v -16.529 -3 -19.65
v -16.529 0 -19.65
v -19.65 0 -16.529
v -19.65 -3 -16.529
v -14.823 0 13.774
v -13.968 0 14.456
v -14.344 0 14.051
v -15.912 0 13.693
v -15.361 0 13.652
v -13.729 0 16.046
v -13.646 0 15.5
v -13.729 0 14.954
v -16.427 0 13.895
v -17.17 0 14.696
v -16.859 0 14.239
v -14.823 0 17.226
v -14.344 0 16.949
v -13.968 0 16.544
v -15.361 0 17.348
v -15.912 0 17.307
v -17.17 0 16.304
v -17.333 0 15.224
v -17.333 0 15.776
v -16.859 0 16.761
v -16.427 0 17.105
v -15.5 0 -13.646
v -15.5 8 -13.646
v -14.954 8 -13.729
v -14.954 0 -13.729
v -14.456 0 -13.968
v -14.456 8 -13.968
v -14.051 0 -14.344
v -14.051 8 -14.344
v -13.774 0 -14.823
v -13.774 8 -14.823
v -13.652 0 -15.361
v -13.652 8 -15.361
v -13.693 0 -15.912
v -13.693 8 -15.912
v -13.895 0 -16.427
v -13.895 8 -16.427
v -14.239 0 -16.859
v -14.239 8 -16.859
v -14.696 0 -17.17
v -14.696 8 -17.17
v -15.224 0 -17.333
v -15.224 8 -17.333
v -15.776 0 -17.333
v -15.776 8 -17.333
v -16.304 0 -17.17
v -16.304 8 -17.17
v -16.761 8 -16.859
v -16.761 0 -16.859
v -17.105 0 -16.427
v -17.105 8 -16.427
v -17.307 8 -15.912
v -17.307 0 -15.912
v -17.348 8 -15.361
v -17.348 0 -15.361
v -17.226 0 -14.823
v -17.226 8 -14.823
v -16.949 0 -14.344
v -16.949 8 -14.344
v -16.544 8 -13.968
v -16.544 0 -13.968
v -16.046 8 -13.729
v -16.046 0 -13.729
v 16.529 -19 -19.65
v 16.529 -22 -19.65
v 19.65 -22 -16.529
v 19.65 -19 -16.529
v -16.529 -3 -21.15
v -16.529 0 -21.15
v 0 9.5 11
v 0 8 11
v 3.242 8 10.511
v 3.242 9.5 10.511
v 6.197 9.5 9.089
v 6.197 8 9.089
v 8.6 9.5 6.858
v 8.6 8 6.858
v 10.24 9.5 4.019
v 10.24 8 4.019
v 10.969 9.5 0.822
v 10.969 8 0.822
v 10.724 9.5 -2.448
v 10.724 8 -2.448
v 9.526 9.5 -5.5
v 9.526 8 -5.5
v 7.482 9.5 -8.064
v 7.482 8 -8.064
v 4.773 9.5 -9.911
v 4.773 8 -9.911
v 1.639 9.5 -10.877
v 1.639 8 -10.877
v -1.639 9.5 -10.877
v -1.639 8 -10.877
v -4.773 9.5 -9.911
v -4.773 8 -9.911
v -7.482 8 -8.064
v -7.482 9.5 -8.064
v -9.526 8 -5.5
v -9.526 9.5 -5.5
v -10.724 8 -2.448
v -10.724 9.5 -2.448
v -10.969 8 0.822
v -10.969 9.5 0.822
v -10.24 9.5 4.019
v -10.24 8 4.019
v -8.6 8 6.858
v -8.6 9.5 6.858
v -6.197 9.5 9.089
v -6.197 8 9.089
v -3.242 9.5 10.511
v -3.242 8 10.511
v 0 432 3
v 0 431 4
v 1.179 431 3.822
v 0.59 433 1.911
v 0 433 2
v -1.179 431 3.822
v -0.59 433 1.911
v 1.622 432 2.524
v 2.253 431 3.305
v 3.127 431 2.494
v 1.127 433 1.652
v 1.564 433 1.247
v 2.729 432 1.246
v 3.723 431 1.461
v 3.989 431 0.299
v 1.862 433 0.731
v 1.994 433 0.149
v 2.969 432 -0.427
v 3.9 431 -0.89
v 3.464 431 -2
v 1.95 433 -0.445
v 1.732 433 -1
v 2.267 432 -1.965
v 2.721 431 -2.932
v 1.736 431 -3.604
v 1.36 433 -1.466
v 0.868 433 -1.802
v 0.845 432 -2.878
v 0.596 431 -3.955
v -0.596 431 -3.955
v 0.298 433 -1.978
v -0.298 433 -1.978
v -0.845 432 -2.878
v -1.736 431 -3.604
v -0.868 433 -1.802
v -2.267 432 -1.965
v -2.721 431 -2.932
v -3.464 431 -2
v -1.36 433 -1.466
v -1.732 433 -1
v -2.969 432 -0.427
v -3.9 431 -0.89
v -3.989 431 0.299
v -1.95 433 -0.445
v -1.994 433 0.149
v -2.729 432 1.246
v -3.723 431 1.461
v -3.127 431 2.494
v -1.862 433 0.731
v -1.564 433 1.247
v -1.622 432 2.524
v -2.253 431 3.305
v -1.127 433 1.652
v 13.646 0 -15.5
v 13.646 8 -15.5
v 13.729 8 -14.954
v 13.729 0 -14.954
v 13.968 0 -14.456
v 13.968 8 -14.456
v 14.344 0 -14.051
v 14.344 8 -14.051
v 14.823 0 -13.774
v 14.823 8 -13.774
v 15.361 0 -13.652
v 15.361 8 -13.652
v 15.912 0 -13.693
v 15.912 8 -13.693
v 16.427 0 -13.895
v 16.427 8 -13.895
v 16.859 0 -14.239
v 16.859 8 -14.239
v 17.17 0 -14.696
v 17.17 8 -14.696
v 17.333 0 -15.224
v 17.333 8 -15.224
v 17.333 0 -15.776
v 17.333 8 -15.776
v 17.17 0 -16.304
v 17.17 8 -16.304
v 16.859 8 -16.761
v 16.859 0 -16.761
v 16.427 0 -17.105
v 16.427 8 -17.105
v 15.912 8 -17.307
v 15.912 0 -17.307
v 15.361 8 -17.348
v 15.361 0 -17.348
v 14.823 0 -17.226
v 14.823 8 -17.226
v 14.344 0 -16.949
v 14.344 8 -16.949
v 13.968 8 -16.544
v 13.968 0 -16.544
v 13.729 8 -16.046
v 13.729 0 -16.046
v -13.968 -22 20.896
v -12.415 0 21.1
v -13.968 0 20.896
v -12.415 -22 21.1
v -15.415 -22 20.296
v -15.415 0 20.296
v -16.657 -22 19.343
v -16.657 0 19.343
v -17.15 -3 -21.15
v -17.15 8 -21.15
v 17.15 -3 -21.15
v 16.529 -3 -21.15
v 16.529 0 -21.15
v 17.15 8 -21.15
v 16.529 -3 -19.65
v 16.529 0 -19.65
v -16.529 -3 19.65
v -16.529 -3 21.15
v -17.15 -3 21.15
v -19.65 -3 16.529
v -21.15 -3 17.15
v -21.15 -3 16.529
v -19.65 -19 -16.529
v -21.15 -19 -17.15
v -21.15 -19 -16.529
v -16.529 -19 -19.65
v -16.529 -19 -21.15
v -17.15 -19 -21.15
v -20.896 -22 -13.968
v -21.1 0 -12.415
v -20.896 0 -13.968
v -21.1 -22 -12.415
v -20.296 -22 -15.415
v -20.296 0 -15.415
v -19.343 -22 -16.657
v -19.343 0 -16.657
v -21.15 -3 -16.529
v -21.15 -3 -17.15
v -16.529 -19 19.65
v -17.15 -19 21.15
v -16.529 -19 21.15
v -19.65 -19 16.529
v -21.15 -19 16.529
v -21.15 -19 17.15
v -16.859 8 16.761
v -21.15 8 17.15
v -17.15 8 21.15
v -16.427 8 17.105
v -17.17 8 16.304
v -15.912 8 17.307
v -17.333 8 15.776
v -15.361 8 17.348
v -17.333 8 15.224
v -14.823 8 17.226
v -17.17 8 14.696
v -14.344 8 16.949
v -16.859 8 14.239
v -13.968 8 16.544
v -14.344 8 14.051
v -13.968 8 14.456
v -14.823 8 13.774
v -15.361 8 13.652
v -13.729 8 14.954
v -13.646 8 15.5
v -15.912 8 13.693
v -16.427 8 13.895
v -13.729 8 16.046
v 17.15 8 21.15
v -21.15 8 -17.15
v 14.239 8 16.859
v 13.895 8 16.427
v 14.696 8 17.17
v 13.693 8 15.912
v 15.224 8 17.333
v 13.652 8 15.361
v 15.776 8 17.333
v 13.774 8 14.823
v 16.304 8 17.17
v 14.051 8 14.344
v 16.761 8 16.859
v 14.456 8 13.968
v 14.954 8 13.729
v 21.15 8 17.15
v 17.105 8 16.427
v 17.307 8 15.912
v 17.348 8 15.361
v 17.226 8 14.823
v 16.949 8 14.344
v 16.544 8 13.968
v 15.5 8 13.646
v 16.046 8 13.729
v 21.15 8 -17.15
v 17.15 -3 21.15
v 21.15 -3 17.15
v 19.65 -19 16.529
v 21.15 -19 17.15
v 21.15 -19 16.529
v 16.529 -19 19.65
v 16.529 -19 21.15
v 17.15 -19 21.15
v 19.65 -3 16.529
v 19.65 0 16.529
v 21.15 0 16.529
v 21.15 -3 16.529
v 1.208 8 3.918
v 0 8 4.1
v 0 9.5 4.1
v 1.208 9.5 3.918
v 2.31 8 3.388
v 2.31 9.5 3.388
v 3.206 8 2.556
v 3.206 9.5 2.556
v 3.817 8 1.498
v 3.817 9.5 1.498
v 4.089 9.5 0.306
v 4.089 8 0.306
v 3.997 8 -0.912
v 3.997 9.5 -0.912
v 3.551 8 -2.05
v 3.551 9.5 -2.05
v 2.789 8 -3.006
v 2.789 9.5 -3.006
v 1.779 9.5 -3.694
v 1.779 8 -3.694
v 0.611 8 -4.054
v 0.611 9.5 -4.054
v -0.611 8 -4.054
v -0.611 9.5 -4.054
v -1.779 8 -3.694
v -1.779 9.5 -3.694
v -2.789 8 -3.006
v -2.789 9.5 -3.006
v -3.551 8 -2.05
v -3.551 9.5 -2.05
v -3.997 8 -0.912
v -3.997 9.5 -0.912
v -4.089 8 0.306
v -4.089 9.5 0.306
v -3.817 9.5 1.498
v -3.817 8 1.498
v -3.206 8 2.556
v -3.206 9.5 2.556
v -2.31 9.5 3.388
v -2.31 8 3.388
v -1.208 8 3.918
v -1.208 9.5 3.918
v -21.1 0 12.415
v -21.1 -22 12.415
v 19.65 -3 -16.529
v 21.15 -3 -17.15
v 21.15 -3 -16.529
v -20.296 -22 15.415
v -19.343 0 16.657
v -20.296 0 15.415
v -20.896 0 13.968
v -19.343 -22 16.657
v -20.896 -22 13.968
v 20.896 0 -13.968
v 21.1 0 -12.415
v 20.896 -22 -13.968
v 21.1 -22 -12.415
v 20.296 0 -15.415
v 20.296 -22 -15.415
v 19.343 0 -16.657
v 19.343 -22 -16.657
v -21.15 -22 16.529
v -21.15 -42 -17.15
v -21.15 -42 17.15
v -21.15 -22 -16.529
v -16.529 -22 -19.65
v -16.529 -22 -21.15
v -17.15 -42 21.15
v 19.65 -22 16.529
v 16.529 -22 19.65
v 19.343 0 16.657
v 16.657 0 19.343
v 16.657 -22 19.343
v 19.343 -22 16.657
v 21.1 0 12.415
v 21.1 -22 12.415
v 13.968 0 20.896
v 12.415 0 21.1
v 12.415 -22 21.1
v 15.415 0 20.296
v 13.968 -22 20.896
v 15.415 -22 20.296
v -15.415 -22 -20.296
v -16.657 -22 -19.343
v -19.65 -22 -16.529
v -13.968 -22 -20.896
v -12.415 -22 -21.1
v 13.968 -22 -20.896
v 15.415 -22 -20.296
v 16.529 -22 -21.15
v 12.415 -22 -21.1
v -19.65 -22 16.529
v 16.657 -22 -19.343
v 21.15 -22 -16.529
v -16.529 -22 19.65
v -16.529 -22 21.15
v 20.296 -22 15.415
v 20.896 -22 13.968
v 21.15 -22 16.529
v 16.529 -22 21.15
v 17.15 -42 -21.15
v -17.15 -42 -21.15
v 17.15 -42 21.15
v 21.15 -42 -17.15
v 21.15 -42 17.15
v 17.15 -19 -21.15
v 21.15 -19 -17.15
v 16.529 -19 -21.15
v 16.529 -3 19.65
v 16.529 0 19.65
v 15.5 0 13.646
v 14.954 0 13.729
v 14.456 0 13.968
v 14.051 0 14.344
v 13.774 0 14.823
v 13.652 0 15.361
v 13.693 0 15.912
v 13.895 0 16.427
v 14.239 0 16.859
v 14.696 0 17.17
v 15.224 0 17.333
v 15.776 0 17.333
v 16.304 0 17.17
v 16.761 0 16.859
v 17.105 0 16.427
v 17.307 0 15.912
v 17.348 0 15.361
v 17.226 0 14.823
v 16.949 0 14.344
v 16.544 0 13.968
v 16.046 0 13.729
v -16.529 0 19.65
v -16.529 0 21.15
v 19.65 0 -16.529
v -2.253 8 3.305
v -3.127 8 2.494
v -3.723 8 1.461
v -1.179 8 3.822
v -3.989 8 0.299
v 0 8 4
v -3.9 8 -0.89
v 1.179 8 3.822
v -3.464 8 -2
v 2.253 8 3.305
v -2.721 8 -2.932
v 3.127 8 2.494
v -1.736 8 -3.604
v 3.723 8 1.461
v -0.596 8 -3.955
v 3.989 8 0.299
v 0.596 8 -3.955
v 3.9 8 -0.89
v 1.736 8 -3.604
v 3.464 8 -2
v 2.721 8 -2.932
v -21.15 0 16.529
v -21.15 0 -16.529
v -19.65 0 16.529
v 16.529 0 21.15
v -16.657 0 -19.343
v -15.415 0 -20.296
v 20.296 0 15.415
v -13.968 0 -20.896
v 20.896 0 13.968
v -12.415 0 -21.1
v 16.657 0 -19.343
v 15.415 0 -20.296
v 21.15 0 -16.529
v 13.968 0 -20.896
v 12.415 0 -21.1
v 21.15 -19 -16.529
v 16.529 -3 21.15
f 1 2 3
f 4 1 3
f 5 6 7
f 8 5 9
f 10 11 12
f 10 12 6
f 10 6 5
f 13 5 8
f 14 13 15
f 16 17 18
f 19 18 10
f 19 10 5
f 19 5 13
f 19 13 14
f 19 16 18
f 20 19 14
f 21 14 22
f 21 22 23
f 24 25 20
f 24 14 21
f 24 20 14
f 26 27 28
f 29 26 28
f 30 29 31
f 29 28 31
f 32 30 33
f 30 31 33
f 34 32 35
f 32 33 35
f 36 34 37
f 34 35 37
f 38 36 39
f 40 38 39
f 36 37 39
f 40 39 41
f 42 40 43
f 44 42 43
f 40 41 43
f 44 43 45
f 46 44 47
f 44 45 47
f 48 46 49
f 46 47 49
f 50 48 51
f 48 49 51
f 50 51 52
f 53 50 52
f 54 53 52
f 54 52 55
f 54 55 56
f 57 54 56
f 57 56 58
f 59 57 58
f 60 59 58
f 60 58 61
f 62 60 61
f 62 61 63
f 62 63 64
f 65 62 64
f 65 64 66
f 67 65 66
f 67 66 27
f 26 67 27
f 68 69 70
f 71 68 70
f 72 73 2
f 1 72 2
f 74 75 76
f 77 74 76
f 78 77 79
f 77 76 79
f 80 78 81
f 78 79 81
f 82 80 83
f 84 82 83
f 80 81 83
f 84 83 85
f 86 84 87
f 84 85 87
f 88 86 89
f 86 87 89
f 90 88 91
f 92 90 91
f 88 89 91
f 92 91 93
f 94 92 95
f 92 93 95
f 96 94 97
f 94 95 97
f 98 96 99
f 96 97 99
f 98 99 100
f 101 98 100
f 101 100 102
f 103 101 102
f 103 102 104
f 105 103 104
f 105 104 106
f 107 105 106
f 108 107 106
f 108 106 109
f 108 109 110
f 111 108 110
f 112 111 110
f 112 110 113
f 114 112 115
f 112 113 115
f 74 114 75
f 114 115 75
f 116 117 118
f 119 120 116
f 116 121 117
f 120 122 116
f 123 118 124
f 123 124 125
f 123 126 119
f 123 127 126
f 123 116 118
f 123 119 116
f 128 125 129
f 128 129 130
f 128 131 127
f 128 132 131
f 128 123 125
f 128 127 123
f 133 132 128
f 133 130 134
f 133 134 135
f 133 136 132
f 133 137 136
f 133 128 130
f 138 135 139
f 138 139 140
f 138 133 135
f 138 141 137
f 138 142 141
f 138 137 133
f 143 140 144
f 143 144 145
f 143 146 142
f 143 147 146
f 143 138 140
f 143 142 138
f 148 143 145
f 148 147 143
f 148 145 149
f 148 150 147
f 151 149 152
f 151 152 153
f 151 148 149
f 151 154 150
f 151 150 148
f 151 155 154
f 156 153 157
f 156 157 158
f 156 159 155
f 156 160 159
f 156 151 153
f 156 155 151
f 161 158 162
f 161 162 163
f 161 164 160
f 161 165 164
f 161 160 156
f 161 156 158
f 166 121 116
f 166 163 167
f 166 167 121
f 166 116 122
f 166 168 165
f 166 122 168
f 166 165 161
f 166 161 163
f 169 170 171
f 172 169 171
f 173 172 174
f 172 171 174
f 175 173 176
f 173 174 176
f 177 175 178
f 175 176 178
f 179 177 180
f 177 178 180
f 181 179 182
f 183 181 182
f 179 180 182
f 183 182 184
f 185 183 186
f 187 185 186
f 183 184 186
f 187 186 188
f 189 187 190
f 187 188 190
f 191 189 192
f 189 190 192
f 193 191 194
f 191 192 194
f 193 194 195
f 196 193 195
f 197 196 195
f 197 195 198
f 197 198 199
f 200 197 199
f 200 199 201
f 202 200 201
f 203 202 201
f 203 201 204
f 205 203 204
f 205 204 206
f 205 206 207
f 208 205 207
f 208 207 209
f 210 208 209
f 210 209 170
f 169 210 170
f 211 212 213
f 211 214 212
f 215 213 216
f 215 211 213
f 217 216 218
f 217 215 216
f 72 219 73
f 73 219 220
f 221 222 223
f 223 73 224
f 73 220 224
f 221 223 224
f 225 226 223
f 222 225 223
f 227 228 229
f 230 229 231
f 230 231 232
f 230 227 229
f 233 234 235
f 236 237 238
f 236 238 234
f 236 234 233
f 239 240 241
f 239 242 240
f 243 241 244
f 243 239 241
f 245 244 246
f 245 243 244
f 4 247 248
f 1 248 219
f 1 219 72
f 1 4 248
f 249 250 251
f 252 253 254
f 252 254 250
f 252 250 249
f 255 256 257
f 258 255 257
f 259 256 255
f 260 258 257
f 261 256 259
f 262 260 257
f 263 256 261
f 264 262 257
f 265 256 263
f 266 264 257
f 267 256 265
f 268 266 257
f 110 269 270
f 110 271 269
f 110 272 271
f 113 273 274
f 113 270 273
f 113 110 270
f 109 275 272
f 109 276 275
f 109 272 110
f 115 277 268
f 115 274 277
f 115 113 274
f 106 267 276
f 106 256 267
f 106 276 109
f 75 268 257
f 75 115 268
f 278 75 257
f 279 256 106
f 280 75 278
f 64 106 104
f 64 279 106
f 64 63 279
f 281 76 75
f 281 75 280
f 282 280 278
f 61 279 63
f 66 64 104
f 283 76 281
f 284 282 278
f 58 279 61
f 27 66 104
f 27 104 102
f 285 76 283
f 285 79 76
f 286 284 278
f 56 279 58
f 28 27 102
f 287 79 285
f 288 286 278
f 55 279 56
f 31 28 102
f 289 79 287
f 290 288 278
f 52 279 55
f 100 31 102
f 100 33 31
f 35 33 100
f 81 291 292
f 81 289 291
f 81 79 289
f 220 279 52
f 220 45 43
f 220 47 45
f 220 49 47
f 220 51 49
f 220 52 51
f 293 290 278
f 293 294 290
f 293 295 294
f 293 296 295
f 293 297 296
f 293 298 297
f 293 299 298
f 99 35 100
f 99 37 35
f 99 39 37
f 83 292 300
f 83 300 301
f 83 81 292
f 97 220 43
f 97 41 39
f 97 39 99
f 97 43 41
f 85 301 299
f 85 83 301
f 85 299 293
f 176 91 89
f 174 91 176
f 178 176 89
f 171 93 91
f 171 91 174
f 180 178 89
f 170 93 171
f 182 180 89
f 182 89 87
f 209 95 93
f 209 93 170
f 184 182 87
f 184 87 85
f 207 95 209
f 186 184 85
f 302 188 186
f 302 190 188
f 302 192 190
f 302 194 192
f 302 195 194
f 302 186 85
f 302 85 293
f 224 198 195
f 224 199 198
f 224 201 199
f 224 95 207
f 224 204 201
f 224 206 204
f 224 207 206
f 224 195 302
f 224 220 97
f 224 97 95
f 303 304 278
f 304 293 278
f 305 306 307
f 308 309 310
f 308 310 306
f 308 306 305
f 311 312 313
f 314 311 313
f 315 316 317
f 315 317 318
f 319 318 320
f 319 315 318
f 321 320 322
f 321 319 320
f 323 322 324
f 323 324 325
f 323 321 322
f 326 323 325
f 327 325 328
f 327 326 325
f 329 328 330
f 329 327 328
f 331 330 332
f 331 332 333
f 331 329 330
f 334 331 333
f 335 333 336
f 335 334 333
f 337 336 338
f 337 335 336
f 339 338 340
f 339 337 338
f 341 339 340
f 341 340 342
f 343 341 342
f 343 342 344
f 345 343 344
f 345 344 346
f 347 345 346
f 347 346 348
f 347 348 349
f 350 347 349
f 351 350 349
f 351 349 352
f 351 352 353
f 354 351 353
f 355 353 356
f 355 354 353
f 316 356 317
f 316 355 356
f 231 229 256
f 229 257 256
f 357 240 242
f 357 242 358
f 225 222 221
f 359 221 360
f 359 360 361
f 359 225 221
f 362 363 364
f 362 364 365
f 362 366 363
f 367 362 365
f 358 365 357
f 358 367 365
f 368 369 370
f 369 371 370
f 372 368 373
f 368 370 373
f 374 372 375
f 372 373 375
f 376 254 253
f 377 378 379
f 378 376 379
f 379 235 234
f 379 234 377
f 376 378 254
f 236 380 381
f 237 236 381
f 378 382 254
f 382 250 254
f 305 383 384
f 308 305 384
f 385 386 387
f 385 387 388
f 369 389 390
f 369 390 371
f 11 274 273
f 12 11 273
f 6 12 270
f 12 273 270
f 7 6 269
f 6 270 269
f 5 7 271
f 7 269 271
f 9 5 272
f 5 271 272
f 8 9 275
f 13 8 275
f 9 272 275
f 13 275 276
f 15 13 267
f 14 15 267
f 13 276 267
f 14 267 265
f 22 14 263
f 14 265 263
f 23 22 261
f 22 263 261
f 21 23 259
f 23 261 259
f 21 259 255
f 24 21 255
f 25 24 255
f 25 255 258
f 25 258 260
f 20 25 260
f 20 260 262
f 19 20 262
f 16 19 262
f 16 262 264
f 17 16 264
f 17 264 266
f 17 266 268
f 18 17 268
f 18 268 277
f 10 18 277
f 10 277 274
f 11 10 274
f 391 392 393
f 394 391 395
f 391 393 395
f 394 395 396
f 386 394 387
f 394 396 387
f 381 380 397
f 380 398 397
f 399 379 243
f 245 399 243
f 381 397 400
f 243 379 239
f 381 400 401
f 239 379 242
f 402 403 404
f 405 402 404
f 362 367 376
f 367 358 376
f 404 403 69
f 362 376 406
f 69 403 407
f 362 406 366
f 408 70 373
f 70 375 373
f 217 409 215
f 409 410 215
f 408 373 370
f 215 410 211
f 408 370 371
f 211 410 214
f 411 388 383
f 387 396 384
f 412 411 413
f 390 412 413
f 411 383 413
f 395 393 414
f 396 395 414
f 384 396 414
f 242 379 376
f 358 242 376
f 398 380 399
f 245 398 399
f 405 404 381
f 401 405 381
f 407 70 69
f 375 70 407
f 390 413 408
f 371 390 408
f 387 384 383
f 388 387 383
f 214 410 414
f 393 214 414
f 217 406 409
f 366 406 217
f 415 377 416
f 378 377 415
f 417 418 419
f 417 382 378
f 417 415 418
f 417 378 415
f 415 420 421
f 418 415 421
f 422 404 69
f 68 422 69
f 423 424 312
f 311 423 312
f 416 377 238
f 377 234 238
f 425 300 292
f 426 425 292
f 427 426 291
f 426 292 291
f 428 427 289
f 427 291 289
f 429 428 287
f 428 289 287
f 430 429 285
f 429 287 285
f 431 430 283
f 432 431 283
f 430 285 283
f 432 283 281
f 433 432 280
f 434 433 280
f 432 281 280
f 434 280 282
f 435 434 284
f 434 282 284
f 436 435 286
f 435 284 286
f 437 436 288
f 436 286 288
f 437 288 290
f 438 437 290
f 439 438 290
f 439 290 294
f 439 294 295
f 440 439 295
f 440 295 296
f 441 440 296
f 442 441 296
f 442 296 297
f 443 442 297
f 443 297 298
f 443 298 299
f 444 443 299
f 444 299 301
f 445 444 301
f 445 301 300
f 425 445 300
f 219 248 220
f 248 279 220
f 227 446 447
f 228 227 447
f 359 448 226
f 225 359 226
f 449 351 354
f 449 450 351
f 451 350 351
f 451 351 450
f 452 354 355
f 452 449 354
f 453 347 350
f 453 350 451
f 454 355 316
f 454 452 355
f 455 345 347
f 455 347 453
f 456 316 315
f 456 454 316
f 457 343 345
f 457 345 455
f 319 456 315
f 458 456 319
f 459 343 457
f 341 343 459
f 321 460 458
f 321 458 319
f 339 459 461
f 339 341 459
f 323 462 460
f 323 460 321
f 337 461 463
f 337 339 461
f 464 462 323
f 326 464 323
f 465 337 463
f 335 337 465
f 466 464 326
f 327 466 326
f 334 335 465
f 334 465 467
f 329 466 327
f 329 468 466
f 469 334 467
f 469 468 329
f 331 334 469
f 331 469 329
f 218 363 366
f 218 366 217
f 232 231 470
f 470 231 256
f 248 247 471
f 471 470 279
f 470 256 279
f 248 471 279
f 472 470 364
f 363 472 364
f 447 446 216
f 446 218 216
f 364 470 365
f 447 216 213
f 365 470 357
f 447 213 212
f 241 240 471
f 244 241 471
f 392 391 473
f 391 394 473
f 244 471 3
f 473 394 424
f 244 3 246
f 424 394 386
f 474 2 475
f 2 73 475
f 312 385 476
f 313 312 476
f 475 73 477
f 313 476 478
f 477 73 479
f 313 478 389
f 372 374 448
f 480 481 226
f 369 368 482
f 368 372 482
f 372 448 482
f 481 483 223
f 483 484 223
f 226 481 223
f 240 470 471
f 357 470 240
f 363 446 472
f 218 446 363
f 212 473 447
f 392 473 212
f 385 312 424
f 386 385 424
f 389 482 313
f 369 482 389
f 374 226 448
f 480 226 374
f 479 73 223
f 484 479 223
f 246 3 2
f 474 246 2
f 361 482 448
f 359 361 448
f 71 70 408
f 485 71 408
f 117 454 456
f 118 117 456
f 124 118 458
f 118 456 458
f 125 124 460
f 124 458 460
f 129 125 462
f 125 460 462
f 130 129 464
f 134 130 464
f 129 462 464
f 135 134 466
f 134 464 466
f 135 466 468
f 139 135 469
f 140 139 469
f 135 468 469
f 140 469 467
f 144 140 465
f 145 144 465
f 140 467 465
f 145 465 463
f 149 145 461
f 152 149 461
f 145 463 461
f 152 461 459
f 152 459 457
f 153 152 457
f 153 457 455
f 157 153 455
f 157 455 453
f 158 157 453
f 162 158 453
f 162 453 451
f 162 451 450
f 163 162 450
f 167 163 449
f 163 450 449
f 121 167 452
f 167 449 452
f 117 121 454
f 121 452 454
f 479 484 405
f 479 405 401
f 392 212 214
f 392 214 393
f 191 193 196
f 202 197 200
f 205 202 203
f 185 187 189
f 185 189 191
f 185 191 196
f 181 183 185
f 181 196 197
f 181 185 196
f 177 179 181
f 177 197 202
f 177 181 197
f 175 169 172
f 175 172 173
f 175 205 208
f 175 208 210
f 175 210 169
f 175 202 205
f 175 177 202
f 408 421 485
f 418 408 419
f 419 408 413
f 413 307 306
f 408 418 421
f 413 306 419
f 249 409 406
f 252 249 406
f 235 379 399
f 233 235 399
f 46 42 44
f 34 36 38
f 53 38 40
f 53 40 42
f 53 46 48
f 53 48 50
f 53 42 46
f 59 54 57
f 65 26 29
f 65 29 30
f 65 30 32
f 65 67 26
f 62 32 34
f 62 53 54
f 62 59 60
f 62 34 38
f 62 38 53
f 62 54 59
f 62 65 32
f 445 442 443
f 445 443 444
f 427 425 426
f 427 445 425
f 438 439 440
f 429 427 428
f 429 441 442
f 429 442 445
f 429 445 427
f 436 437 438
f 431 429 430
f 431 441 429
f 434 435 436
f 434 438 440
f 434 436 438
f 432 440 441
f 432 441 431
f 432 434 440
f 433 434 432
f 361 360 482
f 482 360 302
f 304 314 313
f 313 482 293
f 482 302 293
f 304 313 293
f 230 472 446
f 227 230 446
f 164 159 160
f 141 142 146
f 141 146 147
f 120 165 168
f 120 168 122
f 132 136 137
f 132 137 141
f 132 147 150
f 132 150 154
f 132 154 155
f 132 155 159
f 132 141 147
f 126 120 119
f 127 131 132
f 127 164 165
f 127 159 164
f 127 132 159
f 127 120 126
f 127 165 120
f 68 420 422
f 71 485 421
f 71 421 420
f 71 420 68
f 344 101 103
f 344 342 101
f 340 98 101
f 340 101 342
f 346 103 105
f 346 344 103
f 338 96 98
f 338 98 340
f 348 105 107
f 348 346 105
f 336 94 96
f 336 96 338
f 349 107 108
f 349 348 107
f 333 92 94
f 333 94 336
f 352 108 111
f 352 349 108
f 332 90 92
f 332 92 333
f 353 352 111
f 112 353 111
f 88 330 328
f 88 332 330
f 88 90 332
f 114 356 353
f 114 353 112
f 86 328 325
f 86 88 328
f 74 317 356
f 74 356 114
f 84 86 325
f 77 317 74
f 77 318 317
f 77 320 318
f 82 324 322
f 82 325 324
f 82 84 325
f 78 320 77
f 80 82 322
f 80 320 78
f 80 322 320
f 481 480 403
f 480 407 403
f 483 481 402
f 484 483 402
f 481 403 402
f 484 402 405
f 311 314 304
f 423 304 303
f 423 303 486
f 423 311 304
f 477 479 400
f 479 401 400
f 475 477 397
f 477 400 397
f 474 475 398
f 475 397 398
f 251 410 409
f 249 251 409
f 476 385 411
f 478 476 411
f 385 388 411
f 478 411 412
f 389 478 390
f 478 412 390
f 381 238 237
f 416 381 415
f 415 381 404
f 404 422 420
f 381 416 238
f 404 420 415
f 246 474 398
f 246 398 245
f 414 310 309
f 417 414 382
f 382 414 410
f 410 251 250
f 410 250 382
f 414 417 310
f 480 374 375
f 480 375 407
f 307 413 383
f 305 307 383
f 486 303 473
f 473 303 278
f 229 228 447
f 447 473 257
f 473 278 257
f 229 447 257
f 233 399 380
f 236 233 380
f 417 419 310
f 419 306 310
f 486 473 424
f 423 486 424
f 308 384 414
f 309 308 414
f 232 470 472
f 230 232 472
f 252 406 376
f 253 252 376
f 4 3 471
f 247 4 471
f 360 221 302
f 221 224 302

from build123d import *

# Parameters (mm, degrees)
ESBO_O1_W              = 42.3
ESBO_O1_H              = 42.3
UPPERBODY_DEPTH        = 8
CHANFRO1_SIZE          = 4
ESBO_O2_R              = 11
ESBO_O2_R_2            = 4.1
LITTLETOPCIRCLE_DEPTH  = 1.5
ESBO_O3_R              = 1.853680608
MOUNTINGHOLES_DEPTH    = 25
PADR_OCIRCULAR1_COUNT  = 4
LITTLEMETALTABS_DEPTH  = 3
PADR_OCIRCULAR2_COUNT  = 4
MIDDLEBODY_DEPTH       = 22
FILETE1_R              = 6
ESBO_O9_W              = 42.3
ESBO_O9_H              = 42.3
BOTTOMBODY_DEPTH       = 8
CHANFRO5_SIZE          = 4
LITTLEMETALTABS2_DEPTH = 3
PADR_OCIRCULAR3_COUNT  = 4
ESBO_O4_R              = 4
LEADSCREW_DEPTH        = 425
CHANFRO2_SIZE          = 2
EXTRUDE_1_DEPTH        = 12


with BuildPart() as part:
    # Esboço1 → UpperBody (new body)
    with BuildSketch(Plane(origin=(0, 0, 0), x_dir=(1, 0, 0), z_dir=(0, 1, 0))):
        Rectangle(ESBO_O1_W, ESBO_O1_H)
    extrude(amount=UPPERBODY_DEPTH)

    # Chanfro1
    chanfro1_edges = [part.edges().sort_by_distance(p)[0] for p in [
        (-21.15, 4, 21.15),
        (21.15, 4, -21.15),
        (-21.15, 4, -21.15),
        (21.15, 4, 21.15),
    ]]
    chamfer(chanfro1_edges, length=CHANFRO1_SIZE)

    # Esboço2 → LittleTopCircle (add)
    with BuildSketch(Plane(origin=(0, 8, 0), x_dir=(1, 0, 0), z_dir=(0, 1, 0))):
        Circle(ESBO_O2_R)
        Circle(ESBO_O2_R_2, mode=Mode.SUBTRACT)
    extrude(amount=LITTLETOPCIRCLE_DEPTH)

    # Esboço3 → MountingHoles (cut)
    with BuildSketch(Plane(origin=(0, 8, 0), x_dir=(1, 0, 0), z_dir=(0, 1, 0))):
        with Locations((-15.5, 15.5)):
            Circle(ESBO_O3_R)
    mountingholes = extrude(amount=-MOUNTINGHOLES_DEPTH, mode=Mode.SUBTRACT)

    # PadrãoCircular1: MountingHoles ×4 about axis
    padr_ocircular1_axis = Axis((0, 8, 0), (0, 1, 0))
    for i in range(1, PADR_OCIRCULAR1_COUNT):
        add(mountingholes.rotate(padr_ocircular1_axis, i * 360 / PADR_OCIRCULAR1_COUNT), mode=Mode.SUBTRACT)

    # Esboço7 → LittleMetalTabs (add)
    with BuildSketch(Plane.XZ):
        Polygon((-19.65, -16.528679656), (-21.15, -16.528679656), (-21.15, -17.15), (-17.15, -21.15), (-16.528679656, -21.15), (-16.528679656, -19.65), align=None)
    littlemetaltabs = extrude(amount=LITTLEMETALTABS_DEPTH)

    # PadrãoCircular2: LittleMetalTabs ×4 about axis
    padr_ocircular2_axis = Axis((0, 9.5, 0), (0, 1, 0))
    for i in range(1, PADR_OCIRCULAR2_COUNT):
        add(littlemetaltabs.rotate(padr_ocircular2_axis, i * 360 / PADR_OCIRCULAR2_COUNT))

    # Esboço8 → MiddleBody (add)
    with BuildSketch(Plane.XZ):
        Polygon((-14.9, 21.1), (14.9, 21.1), (21.1, 14.9), (21.1, -14.9), (14.9, -21.1), (-14.9, -21.1), (-21.1, -14.9), (-21.1, 14.9), align=None)
    extrude(amount=MIDDLEBODY_DEPTH)

    # Filete1
    filete1_edges = [part.edges().sort_by_distance(p)[0] for p in [
        (-21.1, -11, -14.9),
        (-21.1, -11, 14.9),
        (-14.9, -11, 21.1),
        (14.9, -11, 21.1),
        (-14.9, -11, -21.1),
        (21.1, -11, 14.9),
        (14.9, -11, -21.1),
        (21.1, -11, -14.9),
    ]]
    fillet(filete1_edges, radius=FILETE1_R)

    # Esboço9 → BottomBody (add)
    with BuildSketch(Plane.XZ.offset(22)):
        Rectangle(ESBO_O9_W, ESBO_O9_H)
    extrude(amount=BOTTOMBODY_DEPTH)

    # Chanfro5
    chanfro5_edges = [part.edges().sort_by_distance(p)[0] for p in [
        (21.15, -26, 21.15),
        (21.15, -26, -21.15),
        (-21.15, -26, 21.15),
        (-21.15, -26, -21.15),
    ]]
    chamfer(chanfro5_edges, length=CHANFRO5_SIZE)

    # Esboço10 → LittleMetalTabs2 (add)
    with BuildSketch(Plane(origin=(0, -22, 0), x_dir=(1, 0, 0), z_dir=(0, 1, 0))):
        Polygon((-16.528679656, -21.15), (-16.528679656, -19.65), (-19.65, -16.528679656), (-21.15, -16.528679656), (-21.15, -17.15), (-17.15, -21.15), align=None)
    littlemetaltabs2 = extrude(amount=LITTLEMETALTABS2_DEPTH)

    # PadrãoCircular3: LittleMetalTabs2 ×4 about axis
    padr_ocircular3_axis = Axis((0, -30, 0), (0, 1, 0))
    for i in range(1, PADR_OCIRCULAR3_COUNT):
        add(littlemetaltabs2.rotate(padr_ocircular3_axis, i * 360 / PADR_OCIRCULAR3_COUNT))

    # Esboço4 → LeadScrew (add)
    with BuildSketch(Plane(origin=(0, 8, 0), x_dir=(1, 0, 0), z_dir=(0, 1, 0))):
        Circle(ESBO_O4_R)
    extrude(amount=LEADSCREW_DEPTH)

    # Chanfro2
    chanfro2_edges = [part.edges().sort_by_distance(p)[0] for p in [
        (-4, 433, 0),
    ]]
    chamfer(chanfro2_edges, length=CHANFRO2_SIZE)

    # 草图6 → 凸台-拉伸1 (add)
    with BuildSketch(Plane.XZ.offset(30)):
        Polygon((21.15, -17.15), (21.15, 17.15), (17.15, 21.15), (-17.15, 21.15), (-21.15, 17.15), (-21.15, -17.15), (-17.15, -21.15), (17.15, -21.15), align=None)
    extrude(amount=EXTRUDE_1_DEPTH)


solid = part.part
